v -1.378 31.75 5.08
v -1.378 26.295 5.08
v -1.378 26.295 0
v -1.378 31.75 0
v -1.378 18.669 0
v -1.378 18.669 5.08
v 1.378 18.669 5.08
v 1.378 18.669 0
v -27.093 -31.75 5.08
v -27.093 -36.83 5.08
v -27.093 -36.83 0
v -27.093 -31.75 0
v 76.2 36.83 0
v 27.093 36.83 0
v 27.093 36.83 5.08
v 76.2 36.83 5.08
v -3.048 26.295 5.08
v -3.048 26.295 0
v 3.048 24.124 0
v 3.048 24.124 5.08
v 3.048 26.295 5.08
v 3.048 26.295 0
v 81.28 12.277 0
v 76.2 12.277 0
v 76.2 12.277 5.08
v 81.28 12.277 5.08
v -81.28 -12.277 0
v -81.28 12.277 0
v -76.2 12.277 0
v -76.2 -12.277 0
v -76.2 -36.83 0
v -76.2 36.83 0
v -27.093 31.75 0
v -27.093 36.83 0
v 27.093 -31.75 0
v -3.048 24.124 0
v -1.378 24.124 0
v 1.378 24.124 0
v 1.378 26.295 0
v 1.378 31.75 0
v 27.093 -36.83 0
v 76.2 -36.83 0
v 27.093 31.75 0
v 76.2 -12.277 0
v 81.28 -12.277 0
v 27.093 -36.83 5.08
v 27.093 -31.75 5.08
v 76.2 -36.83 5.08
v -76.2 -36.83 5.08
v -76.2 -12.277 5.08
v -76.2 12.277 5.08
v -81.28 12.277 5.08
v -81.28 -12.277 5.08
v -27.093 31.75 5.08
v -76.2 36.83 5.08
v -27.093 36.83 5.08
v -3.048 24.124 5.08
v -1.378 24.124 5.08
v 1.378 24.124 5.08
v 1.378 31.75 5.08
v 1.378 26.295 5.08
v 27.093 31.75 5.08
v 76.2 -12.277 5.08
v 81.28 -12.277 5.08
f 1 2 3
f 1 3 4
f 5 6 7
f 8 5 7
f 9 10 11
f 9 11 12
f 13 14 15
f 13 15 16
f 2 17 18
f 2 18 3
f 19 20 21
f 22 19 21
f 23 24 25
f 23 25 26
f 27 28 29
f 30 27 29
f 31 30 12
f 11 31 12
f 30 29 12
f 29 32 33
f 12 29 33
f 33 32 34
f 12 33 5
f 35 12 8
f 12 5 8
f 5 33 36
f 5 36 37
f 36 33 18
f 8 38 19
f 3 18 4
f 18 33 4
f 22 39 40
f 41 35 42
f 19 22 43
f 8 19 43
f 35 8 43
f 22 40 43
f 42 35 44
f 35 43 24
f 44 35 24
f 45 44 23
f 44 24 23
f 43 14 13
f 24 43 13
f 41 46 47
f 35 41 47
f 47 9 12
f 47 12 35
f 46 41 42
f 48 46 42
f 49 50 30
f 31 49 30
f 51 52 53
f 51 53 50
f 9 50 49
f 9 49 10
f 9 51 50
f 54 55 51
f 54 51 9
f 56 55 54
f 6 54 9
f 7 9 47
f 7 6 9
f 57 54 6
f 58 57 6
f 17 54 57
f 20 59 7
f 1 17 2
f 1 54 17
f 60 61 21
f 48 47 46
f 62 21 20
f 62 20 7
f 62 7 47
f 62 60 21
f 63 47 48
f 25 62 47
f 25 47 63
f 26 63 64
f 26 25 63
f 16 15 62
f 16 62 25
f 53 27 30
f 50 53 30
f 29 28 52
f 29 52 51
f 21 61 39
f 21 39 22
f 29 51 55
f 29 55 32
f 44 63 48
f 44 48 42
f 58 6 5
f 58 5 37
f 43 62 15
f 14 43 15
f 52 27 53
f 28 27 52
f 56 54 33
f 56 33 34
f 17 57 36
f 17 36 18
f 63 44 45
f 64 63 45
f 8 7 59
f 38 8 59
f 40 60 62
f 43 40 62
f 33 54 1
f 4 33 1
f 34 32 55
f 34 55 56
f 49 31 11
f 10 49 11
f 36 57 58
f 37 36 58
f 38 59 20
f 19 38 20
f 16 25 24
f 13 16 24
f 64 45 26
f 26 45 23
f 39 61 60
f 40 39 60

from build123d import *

# Parameters (mm, degrees)
SKETCH1_W           = 162.56
SKETCH1_H           = 73.66
BOSS_EXTRUDE1_DEPTH = 5.08
SKETCH2_W           = 54.186666666
SKETCH2_H           = 5.08
CUT_EXTRUDE1_DEPTH  = 90.379492614
SKETCH5_W           = 2.7559
SKETCH5_H           = 13.081
CUT_EXTRUDE4_DEPTH  = 90.379492614
SKETCH6_W           = 6.096
SKETCH6_H           = 2.1717
CUT_EXTRUDE5_DEPTH  = 90.379492614
CAVITY1_START       = -36.83
CAVITY1_OUTLINE_W   = 5.08
CAVITY1_OUTLINE_H   = 5.08
CAVITY1_DEPTH       = 24.553333333
CAVITY1_START_2     = 12.276666667
CAVITY1_2_OUTLINE_W = 5.08
CAVITY1_2_OUTLINE_H = 5.08
CAVITY1_2_DEPTH     = 24.553333333


# Read off the part's stored shape, not the designer's step: Cavity1
with BuildPart() as part:
    # Sketch1 → Boss-Extrude1 (new body)
    with BuildSketch(Plane.XY):
        Rectangle(SKETCH1_W, SKETCH1_H)
    extrude(amount=BOSS_EXTRUDE1_DEPTH)

    # Sketch2 → Cut-Extrude1 (cut, through all)
    with BuildSketch(Plane.XY.offset(5.08)):
        with Locations((0, -34.29)):
            Rectangle(SKETCH2_W, SKETCH2_H)
        with Locations((0, 34.29)):
            Rectangle(SKETCH2_W, SKETCH2_H)
    extrude(amount=-CUT_EXTRUDE1_DEPTH, mode=Mode.SUBTRACT)

    # Sketch5 → Cut-Extrude4 (cut, through all)
    with BuildSketch(Plane.XY.offset(5.08)):
        with Locations((0, 25.2095)):
            Rectangle(SKETCH5_W, SKETCH5_H)
    extrude(amount=-CUT_EXTRUDE4_DEPTH, mode=Mode.SUBTRACT)

    # Sketch6 → Cut-Extrude5 (cut, through all)
    with BuildSketch(Plane.XY.offset(5.08)):
        with Locations((0, 25.2095)):
            Rectangle(SKETCH6_W, SKETCH6_H)
    extrude(amount=-CUT_EXTRUDE5_DEPTH, mode=Mode.SUBTRACT)

    # Cavity1 outline → Cavity1 (cut)
    with BuildSketch(Plane(origin=(0, 0, 0), x_dir=(1, 0, 0), z_dir=(0, 1, 0)).offset(CAVITY1_START)):
        with Locations((78.74, -2.54)):
            Rectangle(CAVITY1_OUTLINE_W, CAVITY1_OUTLINE_H)
        with Locations((-78.74, -2.54)):
            Rectangle(CAVITY1_OUTLINE_W, CAVITY1_OUTLINE_H)
    extrude(amount=CAVITY1_DEPTH, mode=Mode.SUBTRACT)

    # Cavity1 2 outline → Cavity1 2 (cut)
    with BuildSketch(Plane(origin=(0, 0, 0), x_dir=(1, 0, 0), z_dir=(0, 1, 0)).offset(CAVITY1_START_2)):
        with Locations((78.74, -2.54)):
            Rectangle(CAVITY1_2_OUTLINE_W, CAVITY1_2_OUTLINE_H)
        with Locations((-78.74, -2.54)):
            Rectangle(CAVITY1_2_OUTLINE_W, CAVITY1_2_OUTLINE_H)
    extrude(amount=CAVITY1_2_DEPTH, mode=Mode.SUBTRACT)


solid = part.part
